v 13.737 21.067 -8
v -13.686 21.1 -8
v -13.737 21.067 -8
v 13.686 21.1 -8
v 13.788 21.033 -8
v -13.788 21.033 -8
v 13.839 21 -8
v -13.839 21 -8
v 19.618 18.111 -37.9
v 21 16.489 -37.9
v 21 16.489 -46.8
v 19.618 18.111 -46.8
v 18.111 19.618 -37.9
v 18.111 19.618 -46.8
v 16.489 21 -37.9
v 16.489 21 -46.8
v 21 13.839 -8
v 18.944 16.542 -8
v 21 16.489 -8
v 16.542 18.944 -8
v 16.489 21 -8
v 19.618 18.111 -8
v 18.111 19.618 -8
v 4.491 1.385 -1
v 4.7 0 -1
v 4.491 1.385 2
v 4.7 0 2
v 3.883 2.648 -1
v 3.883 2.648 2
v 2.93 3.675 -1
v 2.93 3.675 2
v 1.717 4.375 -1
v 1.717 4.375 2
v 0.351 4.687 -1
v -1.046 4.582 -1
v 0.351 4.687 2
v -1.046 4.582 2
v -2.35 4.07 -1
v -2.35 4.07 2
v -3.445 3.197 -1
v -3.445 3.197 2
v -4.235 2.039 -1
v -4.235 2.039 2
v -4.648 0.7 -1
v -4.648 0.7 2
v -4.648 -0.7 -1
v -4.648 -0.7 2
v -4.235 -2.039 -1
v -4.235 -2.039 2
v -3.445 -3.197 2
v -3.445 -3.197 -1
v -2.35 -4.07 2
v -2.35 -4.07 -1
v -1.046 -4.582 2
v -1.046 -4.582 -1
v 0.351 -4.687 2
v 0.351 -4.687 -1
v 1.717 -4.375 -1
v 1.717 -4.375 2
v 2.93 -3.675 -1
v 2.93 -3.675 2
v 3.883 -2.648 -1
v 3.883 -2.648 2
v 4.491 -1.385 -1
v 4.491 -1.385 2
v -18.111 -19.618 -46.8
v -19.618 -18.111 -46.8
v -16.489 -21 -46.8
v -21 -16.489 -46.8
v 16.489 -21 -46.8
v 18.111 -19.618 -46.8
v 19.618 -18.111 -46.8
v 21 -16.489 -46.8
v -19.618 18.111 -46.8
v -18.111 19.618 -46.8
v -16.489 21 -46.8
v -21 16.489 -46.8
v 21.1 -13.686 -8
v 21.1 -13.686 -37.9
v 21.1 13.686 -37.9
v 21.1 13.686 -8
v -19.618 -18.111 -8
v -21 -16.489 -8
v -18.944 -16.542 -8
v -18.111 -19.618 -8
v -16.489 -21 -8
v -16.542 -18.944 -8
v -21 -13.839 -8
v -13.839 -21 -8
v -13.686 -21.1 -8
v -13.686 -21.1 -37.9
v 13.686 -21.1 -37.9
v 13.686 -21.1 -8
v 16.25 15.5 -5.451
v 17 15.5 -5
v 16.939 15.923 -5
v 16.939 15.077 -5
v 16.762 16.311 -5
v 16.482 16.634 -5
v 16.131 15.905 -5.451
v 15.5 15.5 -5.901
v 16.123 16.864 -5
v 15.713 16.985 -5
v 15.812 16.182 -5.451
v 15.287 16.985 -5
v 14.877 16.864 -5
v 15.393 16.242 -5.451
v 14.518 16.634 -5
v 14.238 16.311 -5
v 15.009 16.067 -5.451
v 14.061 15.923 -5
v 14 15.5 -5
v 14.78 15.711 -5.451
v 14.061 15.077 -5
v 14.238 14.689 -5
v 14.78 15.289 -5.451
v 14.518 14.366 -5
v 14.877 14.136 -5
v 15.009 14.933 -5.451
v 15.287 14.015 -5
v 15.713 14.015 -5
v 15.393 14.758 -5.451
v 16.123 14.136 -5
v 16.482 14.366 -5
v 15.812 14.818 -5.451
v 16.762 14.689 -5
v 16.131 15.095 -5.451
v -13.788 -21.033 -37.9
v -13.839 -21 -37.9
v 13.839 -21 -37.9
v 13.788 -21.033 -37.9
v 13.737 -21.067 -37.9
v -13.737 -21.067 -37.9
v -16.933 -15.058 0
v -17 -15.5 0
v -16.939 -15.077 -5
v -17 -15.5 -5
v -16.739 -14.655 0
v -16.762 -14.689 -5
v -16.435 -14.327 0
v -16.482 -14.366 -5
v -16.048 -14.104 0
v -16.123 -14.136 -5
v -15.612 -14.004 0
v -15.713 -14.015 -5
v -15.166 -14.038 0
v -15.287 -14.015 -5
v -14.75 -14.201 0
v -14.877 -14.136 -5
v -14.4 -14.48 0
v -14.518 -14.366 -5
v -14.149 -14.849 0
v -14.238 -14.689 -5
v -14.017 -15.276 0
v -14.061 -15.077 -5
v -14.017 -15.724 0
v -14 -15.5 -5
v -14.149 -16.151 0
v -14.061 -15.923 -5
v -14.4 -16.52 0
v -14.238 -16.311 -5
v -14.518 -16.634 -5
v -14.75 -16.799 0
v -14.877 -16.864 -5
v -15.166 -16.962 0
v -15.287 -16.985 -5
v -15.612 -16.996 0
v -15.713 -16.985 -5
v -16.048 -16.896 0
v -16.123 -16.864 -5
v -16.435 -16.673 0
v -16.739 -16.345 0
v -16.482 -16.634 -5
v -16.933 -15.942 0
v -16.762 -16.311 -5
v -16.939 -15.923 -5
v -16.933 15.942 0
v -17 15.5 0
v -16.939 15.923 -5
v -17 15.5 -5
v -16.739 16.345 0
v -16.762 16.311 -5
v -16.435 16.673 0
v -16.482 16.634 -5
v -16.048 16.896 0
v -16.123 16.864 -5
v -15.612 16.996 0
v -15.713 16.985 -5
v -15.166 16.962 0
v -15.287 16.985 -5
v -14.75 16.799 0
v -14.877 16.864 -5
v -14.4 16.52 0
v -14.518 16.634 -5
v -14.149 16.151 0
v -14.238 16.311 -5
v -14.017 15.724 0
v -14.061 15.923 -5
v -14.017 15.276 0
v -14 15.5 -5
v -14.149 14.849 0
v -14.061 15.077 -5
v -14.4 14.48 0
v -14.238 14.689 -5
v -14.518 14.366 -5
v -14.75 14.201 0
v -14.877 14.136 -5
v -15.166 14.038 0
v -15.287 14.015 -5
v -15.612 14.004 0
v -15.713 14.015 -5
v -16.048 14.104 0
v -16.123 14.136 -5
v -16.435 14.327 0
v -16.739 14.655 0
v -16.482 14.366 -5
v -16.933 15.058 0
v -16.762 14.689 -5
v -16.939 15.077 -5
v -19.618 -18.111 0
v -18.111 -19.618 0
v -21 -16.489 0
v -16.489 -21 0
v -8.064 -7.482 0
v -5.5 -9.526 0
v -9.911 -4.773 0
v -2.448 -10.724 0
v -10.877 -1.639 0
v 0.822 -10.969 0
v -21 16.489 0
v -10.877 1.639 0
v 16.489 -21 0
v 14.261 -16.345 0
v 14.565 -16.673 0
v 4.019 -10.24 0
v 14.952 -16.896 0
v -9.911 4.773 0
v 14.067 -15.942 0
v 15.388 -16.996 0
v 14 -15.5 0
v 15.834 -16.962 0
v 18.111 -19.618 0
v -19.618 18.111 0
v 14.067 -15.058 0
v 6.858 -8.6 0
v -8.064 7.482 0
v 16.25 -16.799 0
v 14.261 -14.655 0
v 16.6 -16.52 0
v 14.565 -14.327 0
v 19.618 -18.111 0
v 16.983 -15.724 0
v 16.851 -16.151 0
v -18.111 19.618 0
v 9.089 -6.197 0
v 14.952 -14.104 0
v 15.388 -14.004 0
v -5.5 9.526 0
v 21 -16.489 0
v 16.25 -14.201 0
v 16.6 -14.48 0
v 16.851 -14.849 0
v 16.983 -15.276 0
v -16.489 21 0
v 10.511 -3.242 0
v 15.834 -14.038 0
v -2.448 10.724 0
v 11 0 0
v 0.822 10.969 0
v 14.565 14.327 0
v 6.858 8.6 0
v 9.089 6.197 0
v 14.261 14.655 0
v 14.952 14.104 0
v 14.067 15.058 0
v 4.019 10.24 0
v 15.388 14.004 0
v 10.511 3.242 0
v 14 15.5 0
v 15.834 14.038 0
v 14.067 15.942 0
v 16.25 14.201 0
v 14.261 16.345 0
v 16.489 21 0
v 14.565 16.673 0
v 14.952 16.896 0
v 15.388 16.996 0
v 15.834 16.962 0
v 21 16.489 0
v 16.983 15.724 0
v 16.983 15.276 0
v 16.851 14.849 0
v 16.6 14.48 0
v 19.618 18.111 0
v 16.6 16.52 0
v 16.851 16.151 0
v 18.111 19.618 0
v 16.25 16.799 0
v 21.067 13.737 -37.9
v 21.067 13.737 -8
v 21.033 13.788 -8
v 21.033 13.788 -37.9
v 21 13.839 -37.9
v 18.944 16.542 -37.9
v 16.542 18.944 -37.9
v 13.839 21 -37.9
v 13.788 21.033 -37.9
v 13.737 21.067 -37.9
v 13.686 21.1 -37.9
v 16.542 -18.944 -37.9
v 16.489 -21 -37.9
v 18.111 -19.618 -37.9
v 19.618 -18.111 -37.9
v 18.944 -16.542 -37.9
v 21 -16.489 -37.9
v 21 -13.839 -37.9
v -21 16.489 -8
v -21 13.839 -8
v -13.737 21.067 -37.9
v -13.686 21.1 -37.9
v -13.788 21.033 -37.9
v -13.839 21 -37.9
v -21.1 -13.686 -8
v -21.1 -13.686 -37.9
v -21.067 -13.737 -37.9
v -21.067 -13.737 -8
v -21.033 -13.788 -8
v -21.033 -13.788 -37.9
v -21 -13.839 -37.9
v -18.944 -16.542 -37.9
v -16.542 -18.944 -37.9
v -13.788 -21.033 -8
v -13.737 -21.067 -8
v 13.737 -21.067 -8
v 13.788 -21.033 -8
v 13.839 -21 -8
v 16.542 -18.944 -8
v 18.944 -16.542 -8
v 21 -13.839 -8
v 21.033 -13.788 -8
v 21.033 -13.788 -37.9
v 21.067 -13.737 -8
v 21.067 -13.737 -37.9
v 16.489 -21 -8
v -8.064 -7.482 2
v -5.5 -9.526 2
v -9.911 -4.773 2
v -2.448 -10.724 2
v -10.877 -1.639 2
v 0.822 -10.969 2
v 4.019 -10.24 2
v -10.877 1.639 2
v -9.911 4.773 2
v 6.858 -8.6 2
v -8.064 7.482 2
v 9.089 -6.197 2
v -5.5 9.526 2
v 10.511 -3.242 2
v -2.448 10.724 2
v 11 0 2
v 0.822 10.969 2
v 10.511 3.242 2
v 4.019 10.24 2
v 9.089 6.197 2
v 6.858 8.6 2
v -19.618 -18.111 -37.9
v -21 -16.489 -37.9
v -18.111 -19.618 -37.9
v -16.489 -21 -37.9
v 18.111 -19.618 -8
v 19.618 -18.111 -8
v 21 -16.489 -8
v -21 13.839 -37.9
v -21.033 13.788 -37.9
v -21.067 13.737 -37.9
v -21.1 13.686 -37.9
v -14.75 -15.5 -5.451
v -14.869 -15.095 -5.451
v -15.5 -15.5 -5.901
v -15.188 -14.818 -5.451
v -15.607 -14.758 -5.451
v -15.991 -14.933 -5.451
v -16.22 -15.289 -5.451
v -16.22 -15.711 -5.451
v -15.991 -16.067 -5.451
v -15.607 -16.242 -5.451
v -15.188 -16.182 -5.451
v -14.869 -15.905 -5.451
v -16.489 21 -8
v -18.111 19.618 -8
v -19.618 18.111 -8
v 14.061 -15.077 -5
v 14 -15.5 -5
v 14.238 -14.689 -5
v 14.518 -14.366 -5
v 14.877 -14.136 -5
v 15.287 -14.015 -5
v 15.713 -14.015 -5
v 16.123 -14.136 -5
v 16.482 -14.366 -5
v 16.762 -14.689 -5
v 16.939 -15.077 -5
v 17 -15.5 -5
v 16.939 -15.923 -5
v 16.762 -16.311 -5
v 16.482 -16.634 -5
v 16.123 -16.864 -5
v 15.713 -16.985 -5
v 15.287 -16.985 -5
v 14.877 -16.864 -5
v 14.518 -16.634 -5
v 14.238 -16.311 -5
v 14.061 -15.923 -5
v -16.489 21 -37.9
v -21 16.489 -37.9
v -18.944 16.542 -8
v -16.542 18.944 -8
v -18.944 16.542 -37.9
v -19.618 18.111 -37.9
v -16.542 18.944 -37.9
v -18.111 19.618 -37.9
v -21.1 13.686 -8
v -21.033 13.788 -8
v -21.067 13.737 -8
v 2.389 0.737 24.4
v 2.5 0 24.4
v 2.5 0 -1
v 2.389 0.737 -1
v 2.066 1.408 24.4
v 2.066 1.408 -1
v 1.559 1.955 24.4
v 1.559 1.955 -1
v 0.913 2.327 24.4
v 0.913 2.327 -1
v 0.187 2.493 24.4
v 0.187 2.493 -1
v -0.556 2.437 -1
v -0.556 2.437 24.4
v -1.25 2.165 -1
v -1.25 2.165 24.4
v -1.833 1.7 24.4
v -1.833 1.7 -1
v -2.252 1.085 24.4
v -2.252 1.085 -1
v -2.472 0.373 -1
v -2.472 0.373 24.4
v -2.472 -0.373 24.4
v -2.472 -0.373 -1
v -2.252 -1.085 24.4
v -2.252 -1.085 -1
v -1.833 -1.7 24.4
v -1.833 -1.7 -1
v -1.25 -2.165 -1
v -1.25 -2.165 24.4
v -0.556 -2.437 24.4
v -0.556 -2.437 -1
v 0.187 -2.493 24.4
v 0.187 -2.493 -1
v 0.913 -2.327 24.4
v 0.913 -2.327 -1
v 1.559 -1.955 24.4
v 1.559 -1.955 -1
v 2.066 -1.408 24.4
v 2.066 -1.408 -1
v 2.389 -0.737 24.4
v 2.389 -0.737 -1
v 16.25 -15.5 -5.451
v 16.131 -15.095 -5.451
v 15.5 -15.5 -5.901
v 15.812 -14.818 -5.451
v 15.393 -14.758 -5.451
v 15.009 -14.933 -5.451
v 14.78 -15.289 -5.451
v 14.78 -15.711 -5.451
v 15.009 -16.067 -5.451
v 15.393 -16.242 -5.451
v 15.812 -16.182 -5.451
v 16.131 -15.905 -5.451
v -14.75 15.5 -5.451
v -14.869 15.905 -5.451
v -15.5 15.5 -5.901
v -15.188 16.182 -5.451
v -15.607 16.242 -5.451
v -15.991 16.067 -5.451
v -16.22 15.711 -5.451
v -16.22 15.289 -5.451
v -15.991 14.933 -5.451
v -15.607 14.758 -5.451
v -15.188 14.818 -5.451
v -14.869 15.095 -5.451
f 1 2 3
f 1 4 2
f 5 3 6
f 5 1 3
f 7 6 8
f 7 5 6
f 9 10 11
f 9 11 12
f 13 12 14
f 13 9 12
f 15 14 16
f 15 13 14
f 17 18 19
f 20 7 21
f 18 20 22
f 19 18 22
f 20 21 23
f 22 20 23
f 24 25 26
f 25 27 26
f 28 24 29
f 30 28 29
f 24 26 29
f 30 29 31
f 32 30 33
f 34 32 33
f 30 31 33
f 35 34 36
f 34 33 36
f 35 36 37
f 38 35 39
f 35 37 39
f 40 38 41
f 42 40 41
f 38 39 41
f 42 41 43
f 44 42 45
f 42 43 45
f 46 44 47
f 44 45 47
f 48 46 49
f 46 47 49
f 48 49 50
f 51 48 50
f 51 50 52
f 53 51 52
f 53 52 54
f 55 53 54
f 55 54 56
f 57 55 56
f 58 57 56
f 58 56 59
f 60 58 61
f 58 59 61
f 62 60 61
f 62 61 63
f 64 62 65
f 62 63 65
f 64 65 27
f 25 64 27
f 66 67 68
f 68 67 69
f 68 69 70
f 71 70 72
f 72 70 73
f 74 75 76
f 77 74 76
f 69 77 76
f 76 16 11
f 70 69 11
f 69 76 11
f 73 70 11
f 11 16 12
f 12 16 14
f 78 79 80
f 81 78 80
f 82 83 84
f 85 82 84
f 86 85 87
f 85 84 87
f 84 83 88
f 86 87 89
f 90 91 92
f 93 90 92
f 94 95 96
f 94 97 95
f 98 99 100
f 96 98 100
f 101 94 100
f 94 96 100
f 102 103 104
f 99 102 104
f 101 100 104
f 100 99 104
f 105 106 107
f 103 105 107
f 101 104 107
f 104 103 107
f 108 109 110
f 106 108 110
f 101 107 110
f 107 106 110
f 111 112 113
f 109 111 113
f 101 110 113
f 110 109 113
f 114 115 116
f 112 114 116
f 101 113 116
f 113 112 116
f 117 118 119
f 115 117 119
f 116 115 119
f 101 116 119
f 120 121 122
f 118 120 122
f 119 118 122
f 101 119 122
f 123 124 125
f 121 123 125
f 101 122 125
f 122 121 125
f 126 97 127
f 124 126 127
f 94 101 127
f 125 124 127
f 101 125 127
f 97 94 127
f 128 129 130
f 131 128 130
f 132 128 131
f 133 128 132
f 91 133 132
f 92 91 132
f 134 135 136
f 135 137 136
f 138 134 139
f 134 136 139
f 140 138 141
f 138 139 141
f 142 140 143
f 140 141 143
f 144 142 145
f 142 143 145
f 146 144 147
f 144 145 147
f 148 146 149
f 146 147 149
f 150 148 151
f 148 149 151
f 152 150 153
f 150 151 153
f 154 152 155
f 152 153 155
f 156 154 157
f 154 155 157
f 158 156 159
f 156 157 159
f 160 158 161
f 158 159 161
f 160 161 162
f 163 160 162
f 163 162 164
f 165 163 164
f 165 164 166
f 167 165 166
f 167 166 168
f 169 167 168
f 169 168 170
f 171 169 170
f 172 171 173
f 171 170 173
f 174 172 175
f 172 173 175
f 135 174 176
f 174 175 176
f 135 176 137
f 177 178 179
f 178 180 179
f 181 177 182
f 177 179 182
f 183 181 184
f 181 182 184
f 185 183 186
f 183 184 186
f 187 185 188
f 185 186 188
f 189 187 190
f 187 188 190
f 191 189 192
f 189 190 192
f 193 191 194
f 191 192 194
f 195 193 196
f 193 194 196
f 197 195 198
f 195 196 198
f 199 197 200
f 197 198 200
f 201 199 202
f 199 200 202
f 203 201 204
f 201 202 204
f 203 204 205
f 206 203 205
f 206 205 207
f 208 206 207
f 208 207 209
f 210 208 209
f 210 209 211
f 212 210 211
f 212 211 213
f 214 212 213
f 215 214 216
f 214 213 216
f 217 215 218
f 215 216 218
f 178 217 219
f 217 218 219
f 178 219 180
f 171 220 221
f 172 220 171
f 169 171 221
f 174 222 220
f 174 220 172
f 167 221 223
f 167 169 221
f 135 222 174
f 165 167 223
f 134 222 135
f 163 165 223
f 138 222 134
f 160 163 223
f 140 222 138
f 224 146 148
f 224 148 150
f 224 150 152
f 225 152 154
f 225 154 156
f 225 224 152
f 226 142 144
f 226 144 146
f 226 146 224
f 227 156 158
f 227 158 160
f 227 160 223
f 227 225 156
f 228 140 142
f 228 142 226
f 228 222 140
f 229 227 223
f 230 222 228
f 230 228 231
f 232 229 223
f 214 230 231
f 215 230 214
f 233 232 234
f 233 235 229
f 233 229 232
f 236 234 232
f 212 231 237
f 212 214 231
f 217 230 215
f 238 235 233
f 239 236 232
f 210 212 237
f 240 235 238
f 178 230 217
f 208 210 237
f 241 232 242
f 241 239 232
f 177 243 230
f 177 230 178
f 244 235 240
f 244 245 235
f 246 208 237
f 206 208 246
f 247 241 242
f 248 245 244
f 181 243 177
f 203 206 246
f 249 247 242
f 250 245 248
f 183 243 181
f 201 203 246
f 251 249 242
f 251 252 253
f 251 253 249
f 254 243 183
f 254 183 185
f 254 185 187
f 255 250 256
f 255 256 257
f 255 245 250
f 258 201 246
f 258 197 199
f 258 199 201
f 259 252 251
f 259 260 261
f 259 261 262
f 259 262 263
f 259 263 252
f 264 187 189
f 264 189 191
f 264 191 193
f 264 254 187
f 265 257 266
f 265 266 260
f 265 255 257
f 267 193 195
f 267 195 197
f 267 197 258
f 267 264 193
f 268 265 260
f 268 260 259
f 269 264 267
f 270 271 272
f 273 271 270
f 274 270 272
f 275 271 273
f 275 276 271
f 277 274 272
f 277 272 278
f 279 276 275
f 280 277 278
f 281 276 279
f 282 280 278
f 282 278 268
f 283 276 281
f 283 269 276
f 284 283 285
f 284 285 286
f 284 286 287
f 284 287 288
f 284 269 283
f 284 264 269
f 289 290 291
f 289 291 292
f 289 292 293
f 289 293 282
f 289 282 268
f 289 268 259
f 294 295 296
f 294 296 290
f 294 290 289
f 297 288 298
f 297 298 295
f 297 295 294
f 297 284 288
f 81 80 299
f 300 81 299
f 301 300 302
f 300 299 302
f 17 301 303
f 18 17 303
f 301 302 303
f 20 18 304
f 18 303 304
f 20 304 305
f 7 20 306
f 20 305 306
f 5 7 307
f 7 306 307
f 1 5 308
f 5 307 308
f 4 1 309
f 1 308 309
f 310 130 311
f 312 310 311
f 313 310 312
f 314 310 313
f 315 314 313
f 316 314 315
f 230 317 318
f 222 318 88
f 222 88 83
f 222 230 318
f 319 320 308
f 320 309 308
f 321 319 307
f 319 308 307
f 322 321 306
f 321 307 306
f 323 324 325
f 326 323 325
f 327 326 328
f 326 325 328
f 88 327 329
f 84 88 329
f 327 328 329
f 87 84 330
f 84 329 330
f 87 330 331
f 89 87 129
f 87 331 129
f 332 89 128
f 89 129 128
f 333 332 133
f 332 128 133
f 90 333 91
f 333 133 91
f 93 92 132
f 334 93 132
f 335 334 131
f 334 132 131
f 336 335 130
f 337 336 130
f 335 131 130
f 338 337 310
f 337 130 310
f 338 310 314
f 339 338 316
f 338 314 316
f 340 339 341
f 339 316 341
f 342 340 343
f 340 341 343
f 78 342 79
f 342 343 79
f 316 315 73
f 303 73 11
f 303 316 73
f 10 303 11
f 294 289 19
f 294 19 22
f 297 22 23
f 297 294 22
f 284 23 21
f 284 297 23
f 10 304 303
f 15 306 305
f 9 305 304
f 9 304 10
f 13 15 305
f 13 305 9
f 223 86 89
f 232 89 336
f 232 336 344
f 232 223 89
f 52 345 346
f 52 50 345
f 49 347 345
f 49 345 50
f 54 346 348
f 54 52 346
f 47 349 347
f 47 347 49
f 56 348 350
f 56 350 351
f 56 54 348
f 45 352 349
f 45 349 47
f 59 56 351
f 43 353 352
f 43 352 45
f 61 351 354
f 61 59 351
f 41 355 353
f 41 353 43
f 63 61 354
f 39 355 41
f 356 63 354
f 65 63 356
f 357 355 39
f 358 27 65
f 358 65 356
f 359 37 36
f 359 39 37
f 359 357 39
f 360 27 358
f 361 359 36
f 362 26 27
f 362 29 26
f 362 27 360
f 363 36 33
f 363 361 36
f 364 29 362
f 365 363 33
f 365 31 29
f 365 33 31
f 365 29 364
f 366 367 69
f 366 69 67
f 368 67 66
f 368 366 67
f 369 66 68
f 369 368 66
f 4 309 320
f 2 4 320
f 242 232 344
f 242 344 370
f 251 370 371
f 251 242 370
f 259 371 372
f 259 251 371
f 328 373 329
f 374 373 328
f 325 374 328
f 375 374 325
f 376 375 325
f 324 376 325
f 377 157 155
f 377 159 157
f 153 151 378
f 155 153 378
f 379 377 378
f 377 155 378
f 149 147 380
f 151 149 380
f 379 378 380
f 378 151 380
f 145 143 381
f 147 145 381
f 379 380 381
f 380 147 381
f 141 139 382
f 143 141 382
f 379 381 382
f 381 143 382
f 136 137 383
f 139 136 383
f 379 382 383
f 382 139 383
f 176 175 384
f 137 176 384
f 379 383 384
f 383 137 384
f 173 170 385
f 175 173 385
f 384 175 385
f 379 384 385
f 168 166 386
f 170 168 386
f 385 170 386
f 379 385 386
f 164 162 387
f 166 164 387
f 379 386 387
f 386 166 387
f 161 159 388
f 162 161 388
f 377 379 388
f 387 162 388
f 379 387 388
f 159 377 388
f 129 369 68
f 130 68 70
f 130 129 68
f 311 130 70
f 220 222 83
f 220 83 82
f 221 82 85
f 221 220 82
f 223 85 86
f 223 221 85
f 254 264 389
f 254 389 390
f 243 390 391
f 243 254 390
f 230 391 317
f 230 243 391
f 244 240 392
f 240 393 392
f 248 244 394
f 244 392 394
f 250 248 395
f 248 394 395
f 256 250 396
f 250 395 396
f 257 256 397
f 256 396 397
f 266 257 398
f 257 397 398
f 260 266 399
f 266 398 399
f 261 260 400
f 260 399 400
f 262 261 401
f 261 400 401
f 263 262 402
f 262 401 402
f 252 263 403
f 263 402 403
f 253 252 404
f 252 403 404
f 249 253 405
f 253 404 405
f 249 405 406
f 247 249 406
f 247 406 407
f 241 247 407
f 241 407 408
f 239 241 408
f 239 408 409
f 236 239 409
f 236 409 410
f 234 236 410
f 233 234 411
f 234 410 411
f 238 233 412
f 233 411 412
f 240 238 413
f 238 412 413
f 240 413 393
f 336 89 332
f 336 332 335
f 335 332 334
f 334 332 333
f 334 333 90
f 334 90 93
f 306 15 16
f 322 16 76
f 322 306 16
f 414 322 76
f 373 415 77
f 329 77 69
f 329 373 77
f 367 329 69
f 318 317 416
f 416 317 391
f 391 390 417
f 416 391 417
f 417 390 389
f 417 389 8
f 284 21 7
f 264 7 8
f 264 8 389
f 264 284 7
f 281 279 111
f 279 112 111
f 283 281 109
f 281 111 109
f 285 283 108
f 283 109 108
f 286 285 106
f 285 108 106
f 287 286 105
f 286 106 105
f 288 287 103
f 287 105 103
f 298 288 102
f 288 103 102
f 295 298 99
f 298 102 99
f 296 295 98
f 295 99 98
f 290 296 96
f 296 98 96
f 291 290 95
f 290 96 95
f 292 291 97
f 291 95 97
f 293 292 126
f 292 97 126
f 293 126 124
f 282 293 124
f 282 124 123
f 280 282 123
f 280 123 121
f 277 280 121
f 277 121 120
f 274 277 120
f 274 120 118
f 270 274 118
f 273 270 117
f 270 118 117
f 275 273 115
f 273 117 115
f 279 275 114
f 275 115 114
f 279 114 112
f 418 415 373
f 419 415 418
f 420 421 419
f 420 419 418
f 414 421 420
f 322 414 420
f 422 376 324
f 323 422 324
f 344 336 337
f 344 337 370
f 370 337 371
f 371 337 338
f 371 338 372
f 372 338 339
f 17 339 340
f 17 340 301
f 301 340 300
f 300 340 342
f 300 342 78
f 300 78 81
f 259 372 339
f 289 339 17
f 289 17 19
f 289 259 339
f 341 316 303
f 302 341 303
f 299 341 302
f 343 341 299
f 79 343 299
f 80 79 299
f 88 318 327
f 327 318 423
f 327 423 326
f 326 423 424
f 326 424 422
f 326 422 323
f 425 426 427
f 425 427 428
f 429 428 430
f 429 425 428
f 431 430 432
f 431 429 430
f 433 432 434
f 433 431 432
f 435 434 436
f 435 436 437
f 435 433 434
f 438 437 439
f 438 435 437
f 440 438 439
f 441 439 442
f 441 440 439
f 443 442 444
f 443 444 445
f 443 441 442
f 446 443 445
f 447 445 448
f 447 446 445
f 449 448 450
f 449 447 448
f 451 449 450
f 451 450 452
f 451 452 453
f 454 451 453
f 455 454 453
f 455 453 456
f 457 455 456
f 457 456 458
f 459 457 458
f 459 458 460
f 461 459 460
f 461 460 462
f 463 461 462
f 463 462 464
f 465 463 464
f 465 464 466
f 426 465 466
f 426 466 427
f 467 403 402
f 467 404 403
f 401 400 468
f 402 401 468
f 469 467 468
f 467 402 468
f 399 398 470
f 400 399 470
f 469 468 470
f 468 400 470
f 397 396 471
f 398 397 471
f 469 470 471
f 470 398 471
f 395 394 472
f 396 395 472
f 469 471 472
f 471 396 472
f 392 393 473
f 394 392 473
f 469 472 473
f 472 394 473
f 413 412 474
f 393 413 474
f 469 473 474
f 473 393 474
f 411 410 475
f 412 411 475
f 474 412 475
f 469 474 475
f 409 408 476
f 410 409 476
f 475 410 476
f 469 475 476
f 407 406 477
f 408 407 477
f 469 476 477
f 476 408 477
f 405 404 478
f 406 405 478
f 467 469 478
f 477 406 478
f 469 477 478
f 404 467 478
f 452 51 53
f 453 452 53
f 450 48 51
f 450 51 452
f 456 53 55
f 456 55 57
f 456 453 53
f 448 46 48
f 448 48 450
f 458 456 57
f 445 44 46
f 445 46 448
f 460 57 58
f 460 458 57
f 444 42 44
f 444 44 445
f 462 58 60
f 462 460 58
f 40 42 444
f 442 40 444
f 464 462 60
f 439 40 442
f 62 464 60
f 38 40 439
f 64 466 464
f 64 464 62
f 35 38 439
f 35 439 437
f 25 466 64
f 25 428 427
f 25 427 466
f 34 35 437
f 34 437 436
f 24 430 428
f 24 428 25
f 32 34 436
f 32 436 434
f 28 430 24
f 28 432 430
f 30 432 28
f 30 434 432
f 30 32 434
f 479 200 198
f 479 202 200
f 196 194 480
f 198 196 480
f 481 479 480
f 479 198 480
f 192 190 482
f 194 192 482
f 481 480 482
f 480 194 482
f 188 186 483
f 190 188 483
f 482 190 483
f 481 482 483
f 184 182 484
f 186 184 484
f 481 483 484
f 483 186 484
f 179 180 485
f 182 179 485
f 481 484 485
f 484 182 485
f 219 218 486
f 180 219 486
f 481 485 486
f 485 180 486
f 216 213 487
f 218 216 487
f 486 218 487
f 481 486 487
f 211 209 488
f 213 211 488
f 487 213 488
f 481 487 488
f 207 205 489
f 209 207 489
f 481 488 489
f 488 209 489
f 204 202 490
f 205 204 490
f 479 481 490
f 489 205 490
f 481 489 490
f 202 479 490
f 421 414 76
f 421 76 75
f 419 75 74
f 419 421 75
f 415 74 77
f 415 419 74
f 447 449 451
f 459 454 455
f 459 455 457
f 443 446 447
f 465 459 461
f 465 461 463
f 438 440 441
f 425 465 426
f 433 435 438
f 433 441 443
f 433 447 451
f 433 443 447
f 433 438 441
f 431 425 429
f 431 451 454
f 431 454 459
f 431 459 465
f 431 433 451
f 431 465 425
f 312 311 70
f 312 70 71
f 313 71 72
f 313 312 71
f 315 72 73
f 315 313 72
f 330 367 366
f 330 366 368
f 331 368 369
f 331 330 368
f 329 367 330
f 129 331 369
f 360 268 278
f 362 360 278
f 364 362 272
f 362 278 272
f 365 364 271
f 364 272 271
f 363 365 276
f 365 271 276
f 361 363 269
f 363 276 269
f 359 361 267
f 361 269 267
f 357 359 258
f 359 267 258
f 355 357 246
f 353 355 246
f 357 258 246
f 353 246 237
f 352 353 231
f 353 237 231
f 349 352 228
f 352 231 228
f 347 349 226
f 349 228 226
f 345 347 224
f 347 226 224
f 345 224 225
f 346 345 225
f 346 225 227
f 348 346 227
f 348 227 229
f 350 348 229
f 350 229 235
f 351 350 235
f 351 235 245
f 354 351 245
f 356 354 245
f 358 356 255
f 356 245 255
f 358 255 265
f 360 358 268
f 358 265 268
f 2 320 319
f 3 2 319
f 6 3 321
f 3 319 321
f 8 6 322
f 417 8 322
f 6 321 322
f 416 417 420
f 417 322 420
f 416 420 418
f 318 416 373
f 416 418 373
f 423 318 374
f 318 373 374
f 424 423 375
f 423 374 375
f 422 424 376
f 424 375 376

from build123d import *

# Parameters (mm, degrees)
F3_DEPTH       = 8
F6_DEPTH       = 29.9
F8_DEPTH       = 8.9
F9_R           = 11
F9_R_2         = 4.7
F10_DEPTH      = 2
F11_R          = 2.5
F12_DEPTH      = 22.4
F12_DEPTH_BACK = 10
F11_R_2        = 4.7
F13_DEPTH      = 3
F15_D          = 3
F15_DEPTH      = 5
F15_TIP        = 0.9012909285


with BuildPart() as f3:
    # F1 (on Top) → F3 (new body, through all)
    with BuildSketch(Plane.XY):
        with BuildLine():
            ThreePointArc((21, 16.4890873004), (18.8797510577, 18.8797510577), (16.4890873004, 21))
            Line((16.4890873004, 21), (-16.4890873004, 21))
            ThreePointArc((-16.4890873004, 21), (-18.8797510577, 18.8797510577), (-21, 16.4890873004))
            Line((-21, 16.4890873004), (-21, -16.4890873004))
            ThreePointArc((-21, -16.4890873004), (-18.8797510577, -18.8797510577), (-16.4890873004, -21))
            Line((-16.4890873004, -21), (16.4890873004, -21))
            ThreePointArc((16.4890873004, -21), (18.8797510577, -18.8797510577), (21, -16.4890873004))
            Line((21, -16.4890873004), (21, 16.4890873004))
        make_face()
    extrude(amount=-F3_DEPTH)

    # F5 (on offset) → F6 (join, through all)
    with BuildSketch(Plane.XY.offset(-37.9)):
        with BuildLine():
            ThreePointArc((-21.1, -13.6862156932), (-17.7837355468, -17.7837355468), (-13.6862156932, -21.1))
            Line((-13.6862156932, -21.1), (13.6862156932, -21.1))
            ThreePointArc((13.6862156932, -21.1), (17.7837355468, -17.7837355468), (21.1, -13.6862156932))
            Line((21.1, -13.6862156932), (21.1, 13.6862156932))
            ThreePointArc((21.1, 13.6862156932), (17.7837355468, 17.7837355468), (13.6862156932, 21.1))
            Line((13.6862156932, 21.1), (-13.6862156932, 21.1))
            ThreePointArc((-13.6862156932, 21.1), (-17.7837355468, 17.7837355468), (-21.1, 13.6862156932))
            Line((-21.1, 13.6862156932), (-21.1, -13.6862156932))
        make_face()
    extrude(amount=F6_DEPTH)

    # F7 (on offset) → F8 (join)
    with BuildSketch(Plane.XY.offset(-37.9)):
        with BuildLine():
            ThreePointArc((21, 16.4890873004), (18.8797510577, 18.8797510577), (16.4890873004, 21))
            Line((16.4890873004, 21), (-16.4890873004, 21))
            ThreePointArc((-16.4890873004, 21), (-18.8797510577, 18.8797510577), (-21, 16.4890873004))
            Line((-21, 16.4890873004), (-21, -16.4890873004))
            ThreePointArc((-21, -16.4890873004), (-18.8797510577, -18.8797510577), (-16.4890873004, -21))
            Line((-16.4890873004, -21), (16.4890873004, -21))
            ThreePointArc((16.4890873004, -21), (18.8797510577, -18.8797510577), (21, -16.4890873004))
            Line((21, -16.4890873004), (21, 16.4890873004))
        make_face()
    extrude(amount=-F8_DEPTH)

    # F9 (on Top) → F10 (join)
    with BuildSketch(Plane.XY):
        Circle(F9_R)
        Circle(F9_R_2, mode=Mode.SUBTRACT)
    extrude(amount=F10_DEPTH)

    # F11 (on face) → F12 (join, two sides)
    with BuildSketch(Plane.XY.offset(2)) as f12_sk:
        Circle(F11_R)
    extrude(amount=F12_DEPTH)
    extrude(f12_sk.sketch, amount=-F12_DEPTH_BACK)

    # F11 (on face) → F13 (cut)
    with BuildSketch(Plane.XY.offset(2)):
        Circle(F11_R_2)
        Circle(F11_R, mode=Mode.SUBTRACT)
    extrude(amount=-F13_DEPTH, mode=Mode.SUBTRACT)

    # F15
    with Locations(Plane.XY):
        with Locations((-15.5, 15.5), (15.5, 15.5), (15.5, -15.5), (-15.5, -15.5)):
            Hole(F15_D / 2, depth=F15_DEPTH)
            with Locations((0, 0, -(F15_DEPTH + F15_TIP / 2))):  # 118° drill point
                Cone(0, F15_D / 2, F15_TIP, mode=Mode.SUBTRACT)


solid = f3.part
